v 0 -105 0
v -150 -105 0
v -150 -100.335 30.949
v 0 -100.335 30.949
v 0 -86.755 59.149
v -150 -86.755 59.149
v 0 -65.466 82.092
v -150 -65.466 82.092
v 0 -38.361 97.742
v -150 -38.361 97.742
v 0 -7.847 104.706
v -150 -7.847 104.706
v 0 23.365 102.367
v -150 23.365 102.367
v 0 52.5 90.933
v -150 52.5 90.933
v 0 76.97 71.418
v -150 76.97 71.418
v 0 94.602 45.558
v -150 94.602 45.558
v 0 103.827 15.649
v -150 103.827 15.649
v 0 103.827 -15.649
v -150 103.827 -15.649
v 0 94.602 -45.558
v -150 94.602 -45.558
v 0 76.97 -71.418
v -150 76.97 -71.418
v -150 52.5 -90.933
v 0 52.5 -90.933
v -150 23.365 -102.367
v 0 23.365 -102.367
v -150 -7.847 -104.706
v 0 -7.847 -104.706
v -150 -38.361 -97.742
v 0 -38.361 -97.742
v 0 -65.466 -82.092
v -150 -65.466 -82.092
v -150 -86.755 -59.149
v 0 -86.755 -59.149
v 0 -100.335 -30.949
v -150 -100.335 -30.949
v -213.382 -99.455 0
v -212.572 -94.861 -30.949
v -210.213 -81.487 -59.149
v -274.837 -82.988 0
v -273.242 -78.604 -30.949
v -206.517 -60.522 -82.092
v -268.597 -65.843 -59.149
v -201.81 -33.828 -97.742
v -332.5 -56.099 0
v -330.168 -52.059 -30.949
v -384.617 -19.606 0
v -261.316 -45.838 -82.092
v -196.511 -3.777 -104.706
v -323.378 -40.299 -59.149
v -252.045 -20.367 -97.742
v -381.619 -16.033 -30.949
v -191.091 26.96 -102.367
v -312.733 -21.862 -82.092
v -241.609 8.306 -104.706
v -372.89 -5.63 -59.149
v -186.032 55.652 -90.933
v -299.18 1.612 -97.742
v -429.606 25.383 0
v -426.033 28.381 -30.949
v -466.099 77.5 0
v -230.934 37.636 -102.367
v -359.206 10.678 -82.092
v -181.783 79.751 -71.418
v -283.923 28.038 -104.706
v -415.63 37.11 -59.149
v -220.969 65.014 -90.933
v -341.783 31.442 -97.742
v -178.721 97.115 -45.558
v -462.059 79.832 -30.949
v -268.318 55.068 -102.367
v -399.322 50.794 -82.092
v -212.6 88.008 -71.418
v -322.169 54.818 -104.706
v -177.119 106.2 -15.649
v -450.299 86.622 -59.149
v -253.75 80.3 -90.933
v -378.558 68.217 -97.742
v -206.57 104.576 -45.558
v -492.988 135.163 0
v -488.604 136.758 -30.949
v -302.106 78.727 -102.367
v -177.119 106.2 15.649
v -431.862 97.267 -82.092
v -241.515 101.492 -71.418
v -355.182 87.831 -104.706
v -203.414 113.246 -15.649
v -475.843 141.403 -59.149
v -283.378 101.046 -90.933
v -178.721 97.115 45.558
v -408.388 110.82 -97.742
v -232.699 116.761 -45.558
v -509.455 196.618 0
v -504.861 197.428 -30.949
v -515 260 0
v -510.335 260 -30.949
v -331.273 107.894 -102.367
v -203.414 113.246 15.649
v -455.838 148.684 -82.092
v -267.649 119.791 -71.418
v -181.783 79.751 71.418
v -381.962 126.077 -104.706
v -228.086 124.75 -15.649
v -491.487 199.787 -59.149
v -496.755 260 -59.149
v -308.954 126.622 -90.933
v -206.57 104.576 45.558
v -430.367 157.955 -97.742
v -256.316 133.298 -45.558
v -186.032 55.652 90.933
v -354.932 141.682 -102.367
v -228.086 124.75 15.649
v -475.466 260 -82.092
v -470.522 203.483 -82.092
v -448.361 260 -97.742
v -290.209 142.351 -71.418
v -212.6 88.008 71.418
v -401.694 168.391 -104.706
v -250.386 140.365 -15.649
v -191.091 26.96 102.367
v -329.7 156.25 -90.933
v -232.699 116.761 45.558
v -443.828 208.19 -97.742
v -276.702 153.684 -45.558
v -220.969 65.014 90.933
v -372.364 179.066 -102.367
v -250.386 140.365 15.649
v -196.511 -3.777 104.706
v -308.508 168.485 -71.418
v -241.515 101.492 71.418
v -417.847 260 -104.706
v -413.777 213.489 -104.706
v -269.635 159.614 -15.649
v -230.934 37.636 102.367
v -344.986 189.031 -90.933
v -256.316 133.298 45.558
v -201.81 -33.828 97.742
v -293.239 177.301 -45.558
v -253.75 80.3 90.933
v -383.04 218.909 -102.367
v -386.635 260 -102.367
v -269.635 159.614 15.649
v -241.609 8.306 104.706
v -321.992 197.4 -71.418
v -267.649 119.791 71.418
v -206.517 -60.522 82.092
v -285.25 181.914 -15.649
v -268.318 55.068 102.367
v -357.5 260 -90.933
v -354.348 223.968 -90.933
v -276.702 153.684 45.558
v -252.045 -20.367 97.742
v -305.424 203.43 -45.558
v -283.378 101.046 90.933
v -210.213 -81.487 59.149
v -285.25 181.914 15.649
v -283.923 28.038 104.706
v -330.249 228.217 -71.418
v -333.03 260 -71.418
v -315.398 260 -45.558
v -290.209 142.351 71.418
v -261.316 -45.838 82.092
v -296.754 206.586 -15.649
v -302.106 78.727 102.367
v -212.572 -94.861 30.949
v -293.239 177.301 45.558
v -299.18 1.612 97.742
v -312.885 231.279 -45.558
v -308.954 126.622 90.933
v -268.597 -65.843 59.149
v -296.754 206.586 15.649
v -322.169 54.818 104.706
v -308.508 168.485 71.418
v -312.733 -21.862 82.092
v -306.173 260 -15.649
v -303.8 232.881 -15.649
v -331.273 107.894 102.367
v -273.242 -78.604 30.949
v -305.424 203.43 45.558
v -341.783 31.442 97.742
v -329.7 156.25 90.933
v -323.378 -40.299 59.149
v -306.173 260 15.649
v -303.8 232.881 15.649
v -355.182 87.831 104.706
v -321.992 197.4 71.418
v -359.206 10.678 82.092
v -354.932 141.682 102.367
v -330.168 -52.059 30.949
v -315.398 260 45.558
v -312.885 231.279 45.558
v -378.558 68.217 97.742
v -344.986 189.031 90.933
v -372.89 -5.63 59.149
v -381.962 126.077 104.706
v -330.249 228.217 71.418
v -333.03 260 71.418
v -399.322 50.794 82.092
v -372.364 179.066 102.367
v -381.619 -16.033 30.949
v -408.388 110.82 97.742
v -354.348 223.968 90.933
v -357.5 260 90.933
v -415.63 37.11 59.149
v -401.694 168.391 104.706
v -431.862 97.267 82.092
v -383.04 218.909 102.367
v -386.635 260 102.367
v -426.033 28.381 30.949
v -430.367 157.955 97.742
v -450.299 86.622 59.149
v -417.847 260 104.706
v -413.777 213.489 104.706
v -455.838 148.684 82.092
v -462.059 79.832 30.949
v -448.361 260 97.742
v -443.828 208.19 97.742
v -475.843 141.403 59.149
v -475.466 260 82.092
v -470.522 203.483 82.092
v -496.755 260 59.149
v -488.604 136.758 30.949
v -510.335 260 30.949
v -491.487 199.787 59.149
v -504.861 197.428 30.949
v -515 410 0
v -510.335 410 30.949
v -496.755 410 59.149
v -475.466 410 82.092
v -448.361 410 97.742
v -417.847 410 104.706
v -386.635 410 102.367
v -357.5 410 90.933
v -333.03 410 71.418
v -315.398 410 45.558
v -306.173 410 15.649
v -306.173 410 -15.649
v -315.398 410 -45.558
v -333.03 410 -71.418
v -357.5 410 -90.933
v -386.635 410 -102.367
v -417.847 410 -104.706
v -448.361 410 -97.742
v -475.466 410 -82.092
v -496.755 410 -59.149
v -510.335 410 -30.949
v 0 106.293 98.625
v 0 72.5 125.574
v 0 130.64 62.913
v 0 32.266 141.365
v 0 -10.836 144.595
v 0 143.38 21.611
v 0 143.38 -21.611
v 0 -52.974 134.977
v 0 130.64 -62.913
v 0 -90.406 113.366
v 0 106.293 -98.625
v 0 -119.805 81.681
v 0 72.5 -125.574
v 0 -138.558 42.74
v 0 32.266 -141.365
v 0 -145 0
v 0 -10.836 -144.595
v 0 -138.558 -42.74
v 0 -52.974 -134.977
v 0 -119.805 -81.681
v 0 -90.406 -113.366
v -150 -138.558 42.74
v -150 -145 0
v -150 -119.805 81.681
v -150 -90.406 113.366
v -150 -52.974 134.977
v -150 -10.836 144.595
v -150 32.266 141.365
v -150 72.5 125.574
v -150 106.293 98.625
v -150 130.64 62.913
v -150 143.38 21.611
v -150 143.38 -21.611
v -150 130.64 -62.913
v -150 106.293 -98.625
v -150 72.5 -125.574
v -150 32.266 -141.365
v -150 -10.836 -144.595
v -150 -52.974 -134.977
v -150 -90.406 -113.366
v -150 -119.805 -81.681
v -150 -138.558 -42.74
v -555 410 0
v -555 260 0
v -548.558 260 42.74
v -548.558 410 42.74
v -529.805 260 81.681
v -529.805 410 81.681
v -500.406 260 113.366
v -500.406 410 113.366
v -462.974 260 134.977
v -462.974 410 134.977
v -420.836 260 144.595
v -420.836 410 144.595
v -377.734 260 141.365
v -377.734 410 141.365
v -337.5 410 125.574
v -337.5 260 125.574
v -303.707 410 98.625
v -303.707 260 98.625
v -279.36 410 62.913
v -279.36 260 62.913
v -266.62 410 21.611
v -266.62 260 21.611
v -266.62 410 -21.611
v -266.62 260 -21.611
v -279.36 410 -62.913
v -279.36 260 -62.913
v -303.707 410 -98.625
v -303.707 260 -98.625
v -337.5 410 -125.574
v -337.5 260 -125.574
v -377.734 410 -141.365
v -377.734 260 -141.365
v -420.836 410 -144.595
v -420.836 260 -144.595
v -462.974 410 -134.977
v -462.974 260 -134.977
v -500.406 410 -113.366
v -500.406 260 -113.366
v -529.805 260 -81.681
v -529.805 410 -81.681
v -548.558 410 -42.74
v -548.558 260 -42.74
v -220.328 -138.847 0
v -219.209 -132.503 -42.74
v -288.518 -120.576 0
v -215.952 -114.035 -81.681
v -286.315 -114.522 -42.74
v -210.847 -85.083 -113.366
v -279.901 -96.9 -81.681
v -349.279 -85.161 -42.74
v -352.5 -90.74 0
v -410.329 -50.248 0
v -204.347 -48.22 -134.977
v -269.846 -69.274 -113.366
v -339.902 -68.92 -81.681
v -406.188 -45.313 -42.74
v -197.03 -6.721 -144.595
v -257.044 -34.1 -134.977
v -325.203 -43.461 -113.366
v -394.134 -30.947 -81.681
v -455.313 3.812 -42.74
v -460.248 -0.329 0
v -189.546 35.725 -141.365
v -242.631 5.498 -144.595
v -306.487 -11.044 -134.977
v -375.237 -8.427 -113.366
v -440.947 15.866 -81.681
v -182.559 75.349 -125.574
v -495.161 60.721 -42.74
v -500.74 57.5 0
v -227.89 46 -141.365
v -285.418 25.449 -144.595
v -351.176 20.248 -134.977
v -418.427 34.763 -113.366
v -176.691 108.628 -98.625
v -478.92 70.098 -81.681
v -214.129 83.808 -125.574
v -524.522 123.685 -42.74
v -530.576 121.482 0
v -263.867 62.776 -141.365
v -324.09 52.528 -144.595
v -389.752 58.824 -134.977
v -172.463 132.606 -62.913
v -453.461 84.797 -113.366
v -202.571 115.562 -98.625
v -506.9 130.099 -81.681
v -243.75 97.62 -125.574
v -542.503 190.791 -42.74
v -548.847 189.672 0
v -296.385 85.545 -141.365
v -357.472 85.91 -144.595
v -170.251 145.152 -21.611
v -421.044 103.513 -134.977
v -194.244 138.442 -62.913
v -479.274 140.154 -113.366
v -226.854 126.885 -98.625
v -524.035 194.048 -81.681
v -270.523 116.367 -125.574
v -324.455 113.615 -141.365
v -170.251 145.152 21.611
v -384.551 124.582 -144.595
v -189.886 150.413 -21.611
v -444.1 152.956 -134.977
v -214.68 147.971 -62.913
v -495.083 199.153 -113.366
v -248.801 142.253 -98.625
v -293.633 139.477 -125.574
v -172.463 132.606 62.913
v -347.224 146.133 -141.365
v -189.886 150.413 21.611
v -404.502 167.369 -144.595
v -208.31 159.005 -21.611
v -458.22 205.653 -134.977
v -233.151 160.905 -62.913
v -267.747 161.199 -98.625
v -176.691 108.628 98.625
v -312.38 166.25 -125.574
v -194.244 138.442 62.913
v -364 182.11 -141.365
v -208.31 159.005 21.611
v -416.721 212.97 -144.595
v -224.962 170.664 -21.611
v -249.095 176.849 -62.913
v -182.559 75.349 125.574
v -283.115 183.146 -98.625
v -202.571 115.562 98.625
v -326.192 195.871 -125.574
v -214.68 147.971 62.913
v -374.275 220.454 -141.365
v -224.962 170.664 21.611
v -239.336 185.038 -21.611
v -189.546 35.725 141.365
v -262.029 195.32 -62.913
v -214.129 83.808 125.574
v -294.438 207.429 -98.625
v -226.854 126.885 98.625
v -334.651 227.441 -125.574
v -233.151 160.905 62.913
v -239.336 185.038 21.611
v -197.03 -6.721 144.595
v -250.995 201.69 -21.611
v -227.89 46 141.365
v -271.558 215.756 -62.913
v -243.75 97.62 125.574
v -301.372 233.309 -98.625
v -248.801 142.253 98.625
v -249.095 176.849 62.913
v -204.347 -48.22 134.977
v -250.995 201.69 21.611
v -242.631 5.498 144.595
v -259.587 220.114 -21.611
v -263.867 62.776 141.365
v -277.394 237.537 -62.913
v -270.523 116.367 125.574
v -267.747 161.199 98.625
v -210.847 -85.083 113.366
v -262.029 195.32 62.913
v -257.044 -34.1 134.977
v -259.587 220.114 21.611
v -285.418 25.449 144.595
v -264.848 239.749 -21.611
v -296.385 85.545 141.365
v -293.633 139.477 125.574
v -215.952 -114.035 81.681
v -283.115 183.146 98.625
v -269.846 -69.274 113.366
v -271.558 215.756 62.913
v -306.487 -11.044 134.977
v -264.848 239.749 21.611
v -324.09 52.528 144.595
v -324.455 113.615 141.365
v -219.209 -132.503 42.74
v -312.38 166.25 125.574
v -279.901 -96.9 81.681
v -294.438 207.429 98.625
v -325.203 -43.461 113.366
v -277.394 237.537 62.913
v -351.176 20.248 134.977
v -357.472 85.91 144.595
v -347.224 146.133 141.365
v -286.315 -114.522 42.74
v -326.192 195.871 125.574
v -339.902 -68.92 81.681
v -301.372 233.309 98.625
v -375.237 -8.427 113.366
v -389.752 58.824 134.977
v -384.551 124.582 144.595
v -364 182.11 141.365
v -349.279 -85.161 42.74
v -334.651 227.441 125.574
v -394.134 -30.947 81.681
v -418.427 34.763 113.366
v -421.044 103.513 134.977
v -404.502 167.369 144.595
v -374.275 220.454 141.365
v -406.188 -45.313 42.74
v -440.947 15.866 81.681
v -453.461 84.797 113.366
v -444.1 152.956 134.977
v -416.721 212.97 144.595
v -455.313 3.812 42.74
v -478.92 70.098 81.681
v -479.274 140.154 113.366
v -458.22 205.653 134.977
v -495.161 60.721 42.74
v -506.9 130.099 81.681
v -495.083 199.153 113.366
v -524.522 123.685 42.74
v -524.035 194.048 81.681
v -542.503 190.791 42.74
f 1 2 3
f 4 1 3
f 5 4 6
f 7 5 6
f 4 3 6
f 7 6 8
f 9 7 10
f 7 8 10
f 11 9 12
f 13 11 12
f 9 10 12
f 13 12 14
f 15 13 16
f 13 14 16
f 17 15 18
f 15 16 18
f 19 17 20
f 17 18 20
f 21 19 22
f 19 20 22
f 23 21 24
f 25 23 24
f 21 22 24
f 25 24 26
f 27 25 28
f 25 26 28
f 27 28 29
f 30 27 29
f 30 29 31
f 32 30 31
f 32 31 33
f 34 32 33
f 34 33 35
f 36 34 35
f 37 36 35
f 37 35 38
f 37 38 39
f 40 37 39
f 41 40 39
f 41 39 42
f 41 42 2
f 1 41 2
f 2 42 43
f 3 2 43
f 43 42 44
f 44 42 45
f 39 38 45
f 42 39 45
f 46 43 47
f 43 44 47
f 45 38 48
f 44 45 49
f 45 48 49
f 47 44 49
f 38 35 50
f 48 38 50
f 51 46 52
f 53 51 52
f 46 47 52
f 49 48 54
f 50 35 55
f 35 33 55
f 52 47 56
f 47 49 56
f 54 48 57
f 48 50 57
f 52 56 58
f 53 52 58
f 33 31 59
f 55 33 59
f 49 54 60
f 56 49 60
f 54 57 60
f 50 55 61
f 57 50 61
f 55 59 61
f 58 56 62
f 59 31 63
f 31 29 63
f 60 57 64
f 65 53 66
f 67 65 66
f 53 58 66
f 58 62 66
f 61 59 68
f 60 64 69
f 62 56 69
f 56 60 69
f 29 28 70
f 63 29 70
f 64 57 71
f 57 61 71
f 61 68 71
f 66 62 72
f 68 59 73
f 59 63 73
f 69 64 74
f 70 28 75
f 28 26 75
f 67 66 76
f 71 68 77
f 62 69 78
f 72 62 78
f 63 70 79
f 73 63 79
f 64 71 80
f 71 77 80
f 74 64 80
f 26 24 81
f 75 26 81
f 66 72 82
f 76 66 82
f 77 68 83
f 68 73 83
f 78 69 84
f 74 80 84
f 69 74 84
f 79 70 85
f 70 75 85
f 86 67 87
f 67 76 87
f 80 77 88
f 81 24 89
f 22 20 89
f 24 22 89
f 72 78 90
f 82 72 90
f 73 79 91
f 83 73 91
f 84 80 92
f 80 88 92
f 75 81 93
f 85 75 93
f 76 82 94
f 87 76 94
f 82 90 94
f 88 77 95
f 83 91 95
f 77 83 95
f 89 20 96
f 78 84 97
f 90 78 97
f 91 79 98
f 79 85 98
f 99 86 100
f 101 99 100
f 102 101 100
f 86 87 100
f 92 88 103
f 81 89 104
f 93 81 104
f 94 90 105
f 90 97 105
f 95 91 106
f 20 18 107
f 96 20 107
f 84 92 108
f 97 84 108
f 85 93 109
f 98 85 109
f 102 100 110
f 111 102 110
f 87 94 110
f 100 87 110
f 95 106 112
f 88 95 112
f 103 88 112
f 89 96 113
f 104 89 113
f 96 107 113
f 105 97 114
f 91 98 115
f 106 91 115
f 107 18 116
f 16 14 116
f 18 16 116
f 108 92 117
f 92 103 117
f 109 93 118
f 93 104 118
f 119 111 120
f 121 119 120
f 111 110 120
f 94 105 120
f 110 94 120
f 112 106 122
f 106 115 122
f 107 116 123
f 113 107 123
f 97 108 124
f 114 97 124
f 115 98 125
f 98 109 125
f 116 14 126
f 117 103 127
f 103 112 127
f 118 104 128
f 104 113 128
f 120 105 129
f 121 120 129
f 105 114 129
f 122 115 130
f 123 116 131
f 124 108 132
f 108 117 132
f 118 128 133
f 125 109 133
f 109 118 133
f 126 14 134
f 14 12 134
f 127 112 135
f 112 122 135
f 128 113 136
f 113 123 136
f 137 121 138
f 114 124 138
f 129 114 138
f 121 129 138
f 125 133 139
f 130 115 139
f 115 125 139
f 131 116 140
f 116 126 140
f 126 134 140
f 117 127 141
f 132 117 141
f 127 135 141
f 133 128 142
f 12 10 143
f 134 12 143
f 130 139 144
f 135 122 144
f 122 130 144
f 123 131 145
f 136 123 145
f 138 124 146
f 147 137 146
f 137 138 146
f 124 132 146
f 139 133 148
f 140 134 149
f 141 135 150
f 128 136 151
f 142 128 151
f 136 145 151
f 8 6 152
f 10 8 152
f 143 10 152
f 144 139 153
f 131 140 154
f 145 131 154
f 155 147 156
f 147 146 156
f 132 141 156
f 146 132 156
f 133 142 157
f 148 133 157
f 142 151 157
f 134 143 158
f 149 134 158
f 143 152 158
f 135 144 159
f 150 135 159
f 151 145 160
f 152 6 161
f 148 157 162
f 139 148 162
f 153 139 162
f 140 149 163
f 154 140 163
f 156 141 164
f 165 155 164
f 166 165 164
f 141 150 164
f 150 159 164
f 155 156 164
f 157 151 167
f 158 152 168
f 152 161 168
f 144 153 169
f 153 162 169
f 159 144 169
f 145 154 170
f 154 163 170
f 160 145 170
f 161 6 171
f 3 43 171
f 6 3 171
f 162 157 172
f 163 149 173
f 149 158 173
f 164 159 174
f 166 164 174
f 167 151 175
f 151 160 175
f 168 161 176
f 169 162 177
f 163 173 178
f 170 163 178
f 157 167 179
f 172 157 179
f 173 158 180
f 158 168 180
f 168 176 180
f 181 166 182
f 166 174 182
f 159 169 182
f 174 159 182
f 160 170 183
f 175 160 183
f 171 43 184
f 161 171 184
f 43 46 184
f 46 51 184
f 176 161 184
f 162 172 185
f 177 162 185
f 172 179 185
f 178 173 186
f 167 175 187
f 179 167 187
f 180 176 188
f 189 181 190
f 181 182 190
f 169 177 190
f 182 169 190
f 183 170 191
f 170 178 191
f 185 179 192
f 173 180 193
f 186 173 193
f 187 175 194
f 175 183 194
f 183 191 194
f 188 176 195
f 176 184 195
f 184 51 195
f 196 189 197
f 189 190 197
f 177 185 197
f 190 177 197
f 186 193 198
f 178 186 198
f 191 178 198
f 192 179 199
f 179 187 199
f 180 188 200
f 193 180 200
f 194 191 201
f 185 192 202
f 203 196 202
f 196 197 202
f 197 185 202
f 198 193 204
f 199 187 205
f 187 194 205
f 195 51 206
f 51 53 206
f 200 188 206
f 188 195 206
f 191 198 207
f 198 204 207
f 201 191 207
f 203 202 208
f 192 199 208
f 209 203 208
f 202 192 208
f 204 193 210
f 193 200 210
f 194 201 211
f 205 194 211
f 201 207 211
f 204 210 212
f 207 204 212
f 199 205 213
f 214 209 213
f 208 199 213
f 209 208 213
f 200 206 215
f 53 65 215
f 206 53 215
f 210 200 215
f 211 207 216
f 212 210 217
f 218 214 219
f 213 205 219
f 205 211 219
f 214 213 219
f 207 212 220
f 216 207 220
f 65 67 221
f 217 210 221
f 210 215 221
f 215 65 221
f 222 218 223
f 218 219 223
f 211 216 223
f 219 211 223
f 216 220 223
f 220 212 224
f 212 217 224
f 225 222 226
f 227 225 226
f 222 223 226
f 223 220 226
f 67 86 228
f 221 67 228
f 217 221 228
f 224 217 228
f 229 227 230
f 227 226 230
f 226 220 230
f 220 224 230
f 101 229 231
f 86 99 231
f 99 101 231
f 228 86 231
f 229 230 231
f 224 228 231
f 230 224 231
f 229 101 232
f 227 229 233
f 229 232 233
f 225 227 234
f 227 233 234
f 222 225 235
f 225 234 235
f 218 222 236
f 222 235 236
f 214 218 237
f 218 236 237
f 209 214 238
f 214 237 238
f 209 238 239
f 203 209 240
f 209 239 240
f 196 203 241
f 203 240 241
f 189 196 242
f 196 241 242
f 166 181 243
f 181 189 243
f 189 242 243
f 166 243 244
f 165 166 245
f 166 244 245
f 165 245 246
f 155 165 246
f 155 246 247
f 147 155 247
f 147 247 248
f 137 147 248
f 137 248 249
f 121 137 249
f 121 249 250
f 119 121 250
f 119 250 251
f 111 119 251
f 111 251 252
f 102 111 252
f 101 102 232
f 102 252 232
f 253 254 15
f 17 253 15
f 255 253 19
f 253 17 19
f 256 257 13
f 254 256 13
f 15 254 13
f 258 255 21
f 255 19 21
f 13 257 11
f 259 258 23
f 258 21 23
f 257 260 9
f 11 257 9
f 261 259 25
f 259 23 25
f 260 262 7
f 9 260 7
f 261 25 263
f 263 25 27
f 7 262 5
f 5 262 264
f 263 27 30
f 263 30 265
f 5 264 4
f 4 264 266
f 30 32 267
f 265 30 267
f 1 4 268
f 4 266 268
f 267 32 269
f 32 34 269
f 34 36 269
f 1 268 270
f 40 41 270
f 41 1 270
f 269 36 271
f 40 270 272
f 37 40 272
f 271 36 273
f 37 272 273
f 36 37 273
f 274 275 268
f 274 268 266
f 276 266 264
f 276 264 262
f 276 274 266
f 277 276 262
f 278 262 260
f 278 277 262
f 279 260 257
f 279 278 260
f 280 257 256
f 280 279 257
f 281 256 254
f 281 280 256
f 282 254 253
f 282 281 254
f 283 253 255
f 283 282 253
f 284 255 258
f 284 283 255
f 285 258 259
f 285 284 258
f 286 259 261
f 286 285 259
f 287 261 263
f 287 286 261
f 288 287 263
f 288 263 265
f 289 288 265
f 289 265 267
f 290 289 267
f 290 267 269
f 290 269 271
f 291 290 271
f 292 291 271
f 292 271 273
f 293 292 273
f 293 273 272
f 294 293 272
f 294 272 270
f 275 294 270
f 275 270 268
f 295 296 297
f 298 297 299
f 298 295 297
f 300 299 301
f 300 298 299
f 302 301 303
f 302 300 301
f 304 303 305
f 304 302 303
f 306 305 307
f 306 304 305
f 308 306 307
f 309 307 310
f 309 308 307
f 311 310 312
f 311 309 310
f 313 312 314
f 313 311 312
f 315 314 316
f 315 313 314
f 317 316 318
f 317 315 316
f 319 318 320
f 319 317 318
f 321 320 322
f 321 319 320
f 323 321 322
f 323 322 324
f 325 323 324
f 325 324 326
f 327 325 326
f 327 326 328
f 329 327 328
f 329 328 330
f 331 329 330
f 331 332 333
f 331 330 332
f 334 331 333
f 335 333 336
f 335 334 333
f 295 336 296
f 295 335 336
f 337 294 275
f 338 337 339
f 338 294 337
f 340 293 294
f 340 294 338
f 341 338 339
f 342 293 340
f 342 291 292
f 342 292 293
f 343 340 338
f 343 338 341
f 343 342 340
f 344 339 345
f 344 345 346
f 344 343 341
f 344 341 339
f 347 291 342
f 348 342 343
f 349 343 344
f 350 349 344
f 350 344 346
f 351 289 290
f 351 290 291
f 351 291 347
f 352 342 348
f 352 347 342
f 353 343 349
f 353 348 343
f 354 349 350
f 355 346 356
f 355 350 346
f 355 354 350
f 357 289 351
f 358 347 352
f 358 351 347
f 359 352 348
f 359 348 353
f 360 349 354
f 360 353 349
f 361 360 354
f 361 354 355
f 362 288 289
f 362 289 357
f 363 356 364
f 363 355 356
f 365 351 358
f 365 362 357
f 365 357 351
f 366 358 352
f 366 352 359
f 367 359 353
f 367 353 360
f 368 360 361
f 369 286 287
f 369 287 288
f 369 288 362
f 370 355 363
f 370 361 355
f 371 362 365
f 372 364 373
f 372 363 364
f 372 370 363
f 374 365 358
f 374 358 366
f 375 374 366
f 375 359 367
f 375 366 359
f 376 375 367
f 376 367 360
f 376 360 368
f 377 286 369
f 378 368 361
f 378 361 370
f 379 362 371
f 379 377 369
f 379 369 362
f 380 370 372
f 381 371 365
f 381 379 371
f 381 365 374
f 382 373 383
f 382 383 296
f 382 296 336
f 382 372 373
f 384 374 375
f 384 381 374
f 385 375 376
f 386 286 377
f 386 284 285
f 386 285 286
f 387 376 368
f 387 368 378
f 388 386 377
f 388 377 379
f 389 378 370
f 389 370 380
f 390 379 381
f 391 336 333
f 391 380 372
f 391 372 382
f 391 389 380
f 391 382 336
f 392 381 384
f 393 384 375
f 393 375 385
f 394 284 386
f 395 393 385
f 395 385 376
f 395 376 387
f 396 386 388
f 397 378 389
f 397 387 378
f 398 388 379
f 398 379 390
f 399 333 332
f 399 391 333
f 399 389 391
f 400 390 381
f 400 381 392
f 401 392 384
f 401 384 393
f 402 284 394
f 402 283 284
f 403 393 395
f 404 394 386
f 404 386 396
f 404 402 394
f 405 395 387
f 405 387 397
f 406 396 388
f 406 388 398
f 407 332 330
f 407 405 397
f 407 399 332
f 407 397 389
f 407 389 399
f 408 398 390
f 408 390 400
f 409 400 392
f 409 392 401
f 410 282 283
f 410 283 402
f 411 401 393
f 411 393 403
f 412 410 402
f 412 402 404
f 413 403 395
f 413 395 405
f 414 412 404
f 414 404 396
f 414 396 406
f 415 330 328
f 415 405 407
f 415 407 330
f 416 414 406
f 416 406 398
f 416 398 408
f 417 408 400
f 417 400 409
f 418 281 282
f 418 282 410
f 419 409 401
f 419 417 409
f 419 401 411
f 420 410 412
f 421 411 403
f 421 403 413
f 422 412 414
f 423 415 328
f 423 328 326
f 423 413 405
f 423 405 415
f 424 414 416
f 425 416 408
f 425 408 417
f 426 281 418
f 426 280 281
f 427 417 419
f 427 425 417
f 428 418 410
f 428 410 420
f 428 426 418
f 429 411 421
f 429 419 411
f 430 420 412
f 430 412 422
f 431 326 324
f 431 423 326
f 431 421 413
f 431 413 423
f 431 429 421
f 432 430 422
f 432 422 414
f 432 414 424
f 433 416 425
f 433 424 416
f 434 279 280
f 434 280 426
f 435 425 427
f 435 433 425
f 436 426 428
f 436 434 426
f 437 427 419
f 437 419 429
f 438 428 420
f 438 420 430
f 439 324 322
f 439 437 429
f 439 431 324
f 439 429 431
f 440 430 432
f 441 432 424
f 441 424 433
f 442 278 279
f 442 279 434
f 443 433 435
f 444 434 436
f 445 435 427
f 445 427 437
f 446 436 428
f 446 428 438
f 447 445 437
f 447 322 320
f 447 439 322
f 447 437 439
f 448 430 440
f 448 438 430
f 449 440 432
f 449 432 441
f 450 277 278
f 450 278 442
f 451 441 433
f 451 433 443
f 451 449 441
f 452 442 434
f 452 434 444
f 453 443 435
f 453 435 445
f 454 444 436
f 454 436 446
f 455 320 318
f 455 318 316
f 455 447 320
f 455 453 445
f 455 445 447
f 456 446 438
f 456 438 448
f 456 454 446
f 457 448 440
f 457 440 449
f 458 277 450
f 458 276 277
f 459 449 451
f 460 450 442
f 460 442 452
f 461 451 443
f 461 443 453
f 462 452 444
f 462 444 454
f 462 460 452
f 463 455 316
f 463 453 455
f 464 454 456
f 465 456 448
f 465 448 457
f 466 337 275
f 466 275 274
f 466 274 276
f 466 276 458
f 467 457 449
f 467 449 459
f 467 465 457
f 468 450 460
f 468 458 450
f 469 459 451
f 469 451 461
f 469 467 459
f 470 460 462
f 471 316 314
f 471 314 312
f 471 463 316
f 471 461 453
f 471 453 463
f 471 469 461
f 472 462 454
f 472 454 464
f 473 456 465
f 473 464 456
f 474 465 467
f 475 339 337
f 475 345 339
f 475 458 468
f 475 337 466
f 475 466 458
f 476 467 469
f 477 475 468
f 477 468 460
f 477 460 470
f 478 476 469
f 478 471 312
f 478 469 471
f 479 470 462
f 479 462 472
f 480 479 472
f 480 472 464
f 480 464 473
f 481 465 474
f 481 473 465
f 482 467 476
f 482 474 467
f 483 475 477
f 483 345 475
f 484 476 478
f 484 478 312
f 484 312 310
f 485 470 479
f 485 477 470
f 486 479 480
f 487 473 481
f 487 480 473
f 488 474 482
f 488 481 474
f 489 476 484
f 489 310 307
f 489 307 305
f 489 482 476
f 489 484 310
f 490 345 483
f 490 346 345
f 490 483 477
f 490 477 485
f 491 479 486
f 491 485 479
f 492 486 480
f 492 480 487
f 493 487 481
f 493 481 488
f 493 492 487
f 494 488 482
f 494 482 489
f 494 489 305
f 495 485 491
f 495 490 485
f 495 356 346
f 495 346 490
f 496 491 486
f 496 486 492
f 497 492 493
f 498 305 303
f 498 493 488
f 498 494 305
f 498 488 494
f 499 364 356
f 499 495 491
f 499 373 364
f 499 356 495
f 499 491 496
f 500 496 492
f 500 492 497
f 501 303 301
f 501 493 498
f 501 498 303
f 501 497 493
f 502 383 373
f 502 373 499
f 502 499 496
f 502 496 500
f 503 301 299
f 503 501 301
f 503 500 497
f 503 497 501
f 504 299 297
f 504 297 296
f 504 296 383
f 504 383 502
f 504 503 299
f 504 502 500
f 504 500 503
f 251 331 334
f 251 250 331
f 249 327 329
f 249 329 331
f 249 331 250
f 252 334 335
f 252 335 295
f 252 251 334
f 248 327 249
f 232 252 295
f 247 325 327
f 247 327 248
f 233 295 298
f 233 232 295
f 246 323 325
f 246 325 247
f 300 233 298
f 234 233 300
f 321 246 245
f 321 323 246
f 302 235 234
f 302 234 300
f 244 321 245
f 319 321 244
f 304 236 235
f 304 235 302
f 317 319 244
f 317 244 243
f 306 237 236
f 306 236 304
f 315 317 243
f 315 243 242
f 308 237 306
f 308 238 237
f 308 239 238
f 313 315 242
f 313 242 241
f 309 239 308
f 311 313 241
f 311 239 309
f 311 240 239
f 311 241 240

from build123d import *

# Parameters (mm, degrees)
SWEEP_THIN1_PROFILE_R   = 145
SWEEP_THIN1_PROFILE_R_2 = 105


with BuildPart() as part:
    # Sweep-Thin1: sweep along a path in Sketch1
    with BuildLine(Plane.XY) as sweep_thin1_path:
        Line((0, 0), (-150, 0))
        ThreePointArc((-150, 0), (-333.847763109, 76.152236891), (-410, 260))
        Line((-410, 260), (-410, 410))
    # Sweep-Thin1 profile (on start of the path) → Sweep-Thin1 (sweep)
    with BuildSketch(Plane(origin=(0, 0, 0), x_dir=(0, -1, 0), z_dir=(-1, 0, 0))):
        Circle(SWEEP_THIN1_PROFILE_R)
        Circle(SWEEP_THIN1_PROFILE_R_2, mode=Mode.SUBTRACT)
    sweep(path=sweep_thin1_path.line)


solid = part.part
